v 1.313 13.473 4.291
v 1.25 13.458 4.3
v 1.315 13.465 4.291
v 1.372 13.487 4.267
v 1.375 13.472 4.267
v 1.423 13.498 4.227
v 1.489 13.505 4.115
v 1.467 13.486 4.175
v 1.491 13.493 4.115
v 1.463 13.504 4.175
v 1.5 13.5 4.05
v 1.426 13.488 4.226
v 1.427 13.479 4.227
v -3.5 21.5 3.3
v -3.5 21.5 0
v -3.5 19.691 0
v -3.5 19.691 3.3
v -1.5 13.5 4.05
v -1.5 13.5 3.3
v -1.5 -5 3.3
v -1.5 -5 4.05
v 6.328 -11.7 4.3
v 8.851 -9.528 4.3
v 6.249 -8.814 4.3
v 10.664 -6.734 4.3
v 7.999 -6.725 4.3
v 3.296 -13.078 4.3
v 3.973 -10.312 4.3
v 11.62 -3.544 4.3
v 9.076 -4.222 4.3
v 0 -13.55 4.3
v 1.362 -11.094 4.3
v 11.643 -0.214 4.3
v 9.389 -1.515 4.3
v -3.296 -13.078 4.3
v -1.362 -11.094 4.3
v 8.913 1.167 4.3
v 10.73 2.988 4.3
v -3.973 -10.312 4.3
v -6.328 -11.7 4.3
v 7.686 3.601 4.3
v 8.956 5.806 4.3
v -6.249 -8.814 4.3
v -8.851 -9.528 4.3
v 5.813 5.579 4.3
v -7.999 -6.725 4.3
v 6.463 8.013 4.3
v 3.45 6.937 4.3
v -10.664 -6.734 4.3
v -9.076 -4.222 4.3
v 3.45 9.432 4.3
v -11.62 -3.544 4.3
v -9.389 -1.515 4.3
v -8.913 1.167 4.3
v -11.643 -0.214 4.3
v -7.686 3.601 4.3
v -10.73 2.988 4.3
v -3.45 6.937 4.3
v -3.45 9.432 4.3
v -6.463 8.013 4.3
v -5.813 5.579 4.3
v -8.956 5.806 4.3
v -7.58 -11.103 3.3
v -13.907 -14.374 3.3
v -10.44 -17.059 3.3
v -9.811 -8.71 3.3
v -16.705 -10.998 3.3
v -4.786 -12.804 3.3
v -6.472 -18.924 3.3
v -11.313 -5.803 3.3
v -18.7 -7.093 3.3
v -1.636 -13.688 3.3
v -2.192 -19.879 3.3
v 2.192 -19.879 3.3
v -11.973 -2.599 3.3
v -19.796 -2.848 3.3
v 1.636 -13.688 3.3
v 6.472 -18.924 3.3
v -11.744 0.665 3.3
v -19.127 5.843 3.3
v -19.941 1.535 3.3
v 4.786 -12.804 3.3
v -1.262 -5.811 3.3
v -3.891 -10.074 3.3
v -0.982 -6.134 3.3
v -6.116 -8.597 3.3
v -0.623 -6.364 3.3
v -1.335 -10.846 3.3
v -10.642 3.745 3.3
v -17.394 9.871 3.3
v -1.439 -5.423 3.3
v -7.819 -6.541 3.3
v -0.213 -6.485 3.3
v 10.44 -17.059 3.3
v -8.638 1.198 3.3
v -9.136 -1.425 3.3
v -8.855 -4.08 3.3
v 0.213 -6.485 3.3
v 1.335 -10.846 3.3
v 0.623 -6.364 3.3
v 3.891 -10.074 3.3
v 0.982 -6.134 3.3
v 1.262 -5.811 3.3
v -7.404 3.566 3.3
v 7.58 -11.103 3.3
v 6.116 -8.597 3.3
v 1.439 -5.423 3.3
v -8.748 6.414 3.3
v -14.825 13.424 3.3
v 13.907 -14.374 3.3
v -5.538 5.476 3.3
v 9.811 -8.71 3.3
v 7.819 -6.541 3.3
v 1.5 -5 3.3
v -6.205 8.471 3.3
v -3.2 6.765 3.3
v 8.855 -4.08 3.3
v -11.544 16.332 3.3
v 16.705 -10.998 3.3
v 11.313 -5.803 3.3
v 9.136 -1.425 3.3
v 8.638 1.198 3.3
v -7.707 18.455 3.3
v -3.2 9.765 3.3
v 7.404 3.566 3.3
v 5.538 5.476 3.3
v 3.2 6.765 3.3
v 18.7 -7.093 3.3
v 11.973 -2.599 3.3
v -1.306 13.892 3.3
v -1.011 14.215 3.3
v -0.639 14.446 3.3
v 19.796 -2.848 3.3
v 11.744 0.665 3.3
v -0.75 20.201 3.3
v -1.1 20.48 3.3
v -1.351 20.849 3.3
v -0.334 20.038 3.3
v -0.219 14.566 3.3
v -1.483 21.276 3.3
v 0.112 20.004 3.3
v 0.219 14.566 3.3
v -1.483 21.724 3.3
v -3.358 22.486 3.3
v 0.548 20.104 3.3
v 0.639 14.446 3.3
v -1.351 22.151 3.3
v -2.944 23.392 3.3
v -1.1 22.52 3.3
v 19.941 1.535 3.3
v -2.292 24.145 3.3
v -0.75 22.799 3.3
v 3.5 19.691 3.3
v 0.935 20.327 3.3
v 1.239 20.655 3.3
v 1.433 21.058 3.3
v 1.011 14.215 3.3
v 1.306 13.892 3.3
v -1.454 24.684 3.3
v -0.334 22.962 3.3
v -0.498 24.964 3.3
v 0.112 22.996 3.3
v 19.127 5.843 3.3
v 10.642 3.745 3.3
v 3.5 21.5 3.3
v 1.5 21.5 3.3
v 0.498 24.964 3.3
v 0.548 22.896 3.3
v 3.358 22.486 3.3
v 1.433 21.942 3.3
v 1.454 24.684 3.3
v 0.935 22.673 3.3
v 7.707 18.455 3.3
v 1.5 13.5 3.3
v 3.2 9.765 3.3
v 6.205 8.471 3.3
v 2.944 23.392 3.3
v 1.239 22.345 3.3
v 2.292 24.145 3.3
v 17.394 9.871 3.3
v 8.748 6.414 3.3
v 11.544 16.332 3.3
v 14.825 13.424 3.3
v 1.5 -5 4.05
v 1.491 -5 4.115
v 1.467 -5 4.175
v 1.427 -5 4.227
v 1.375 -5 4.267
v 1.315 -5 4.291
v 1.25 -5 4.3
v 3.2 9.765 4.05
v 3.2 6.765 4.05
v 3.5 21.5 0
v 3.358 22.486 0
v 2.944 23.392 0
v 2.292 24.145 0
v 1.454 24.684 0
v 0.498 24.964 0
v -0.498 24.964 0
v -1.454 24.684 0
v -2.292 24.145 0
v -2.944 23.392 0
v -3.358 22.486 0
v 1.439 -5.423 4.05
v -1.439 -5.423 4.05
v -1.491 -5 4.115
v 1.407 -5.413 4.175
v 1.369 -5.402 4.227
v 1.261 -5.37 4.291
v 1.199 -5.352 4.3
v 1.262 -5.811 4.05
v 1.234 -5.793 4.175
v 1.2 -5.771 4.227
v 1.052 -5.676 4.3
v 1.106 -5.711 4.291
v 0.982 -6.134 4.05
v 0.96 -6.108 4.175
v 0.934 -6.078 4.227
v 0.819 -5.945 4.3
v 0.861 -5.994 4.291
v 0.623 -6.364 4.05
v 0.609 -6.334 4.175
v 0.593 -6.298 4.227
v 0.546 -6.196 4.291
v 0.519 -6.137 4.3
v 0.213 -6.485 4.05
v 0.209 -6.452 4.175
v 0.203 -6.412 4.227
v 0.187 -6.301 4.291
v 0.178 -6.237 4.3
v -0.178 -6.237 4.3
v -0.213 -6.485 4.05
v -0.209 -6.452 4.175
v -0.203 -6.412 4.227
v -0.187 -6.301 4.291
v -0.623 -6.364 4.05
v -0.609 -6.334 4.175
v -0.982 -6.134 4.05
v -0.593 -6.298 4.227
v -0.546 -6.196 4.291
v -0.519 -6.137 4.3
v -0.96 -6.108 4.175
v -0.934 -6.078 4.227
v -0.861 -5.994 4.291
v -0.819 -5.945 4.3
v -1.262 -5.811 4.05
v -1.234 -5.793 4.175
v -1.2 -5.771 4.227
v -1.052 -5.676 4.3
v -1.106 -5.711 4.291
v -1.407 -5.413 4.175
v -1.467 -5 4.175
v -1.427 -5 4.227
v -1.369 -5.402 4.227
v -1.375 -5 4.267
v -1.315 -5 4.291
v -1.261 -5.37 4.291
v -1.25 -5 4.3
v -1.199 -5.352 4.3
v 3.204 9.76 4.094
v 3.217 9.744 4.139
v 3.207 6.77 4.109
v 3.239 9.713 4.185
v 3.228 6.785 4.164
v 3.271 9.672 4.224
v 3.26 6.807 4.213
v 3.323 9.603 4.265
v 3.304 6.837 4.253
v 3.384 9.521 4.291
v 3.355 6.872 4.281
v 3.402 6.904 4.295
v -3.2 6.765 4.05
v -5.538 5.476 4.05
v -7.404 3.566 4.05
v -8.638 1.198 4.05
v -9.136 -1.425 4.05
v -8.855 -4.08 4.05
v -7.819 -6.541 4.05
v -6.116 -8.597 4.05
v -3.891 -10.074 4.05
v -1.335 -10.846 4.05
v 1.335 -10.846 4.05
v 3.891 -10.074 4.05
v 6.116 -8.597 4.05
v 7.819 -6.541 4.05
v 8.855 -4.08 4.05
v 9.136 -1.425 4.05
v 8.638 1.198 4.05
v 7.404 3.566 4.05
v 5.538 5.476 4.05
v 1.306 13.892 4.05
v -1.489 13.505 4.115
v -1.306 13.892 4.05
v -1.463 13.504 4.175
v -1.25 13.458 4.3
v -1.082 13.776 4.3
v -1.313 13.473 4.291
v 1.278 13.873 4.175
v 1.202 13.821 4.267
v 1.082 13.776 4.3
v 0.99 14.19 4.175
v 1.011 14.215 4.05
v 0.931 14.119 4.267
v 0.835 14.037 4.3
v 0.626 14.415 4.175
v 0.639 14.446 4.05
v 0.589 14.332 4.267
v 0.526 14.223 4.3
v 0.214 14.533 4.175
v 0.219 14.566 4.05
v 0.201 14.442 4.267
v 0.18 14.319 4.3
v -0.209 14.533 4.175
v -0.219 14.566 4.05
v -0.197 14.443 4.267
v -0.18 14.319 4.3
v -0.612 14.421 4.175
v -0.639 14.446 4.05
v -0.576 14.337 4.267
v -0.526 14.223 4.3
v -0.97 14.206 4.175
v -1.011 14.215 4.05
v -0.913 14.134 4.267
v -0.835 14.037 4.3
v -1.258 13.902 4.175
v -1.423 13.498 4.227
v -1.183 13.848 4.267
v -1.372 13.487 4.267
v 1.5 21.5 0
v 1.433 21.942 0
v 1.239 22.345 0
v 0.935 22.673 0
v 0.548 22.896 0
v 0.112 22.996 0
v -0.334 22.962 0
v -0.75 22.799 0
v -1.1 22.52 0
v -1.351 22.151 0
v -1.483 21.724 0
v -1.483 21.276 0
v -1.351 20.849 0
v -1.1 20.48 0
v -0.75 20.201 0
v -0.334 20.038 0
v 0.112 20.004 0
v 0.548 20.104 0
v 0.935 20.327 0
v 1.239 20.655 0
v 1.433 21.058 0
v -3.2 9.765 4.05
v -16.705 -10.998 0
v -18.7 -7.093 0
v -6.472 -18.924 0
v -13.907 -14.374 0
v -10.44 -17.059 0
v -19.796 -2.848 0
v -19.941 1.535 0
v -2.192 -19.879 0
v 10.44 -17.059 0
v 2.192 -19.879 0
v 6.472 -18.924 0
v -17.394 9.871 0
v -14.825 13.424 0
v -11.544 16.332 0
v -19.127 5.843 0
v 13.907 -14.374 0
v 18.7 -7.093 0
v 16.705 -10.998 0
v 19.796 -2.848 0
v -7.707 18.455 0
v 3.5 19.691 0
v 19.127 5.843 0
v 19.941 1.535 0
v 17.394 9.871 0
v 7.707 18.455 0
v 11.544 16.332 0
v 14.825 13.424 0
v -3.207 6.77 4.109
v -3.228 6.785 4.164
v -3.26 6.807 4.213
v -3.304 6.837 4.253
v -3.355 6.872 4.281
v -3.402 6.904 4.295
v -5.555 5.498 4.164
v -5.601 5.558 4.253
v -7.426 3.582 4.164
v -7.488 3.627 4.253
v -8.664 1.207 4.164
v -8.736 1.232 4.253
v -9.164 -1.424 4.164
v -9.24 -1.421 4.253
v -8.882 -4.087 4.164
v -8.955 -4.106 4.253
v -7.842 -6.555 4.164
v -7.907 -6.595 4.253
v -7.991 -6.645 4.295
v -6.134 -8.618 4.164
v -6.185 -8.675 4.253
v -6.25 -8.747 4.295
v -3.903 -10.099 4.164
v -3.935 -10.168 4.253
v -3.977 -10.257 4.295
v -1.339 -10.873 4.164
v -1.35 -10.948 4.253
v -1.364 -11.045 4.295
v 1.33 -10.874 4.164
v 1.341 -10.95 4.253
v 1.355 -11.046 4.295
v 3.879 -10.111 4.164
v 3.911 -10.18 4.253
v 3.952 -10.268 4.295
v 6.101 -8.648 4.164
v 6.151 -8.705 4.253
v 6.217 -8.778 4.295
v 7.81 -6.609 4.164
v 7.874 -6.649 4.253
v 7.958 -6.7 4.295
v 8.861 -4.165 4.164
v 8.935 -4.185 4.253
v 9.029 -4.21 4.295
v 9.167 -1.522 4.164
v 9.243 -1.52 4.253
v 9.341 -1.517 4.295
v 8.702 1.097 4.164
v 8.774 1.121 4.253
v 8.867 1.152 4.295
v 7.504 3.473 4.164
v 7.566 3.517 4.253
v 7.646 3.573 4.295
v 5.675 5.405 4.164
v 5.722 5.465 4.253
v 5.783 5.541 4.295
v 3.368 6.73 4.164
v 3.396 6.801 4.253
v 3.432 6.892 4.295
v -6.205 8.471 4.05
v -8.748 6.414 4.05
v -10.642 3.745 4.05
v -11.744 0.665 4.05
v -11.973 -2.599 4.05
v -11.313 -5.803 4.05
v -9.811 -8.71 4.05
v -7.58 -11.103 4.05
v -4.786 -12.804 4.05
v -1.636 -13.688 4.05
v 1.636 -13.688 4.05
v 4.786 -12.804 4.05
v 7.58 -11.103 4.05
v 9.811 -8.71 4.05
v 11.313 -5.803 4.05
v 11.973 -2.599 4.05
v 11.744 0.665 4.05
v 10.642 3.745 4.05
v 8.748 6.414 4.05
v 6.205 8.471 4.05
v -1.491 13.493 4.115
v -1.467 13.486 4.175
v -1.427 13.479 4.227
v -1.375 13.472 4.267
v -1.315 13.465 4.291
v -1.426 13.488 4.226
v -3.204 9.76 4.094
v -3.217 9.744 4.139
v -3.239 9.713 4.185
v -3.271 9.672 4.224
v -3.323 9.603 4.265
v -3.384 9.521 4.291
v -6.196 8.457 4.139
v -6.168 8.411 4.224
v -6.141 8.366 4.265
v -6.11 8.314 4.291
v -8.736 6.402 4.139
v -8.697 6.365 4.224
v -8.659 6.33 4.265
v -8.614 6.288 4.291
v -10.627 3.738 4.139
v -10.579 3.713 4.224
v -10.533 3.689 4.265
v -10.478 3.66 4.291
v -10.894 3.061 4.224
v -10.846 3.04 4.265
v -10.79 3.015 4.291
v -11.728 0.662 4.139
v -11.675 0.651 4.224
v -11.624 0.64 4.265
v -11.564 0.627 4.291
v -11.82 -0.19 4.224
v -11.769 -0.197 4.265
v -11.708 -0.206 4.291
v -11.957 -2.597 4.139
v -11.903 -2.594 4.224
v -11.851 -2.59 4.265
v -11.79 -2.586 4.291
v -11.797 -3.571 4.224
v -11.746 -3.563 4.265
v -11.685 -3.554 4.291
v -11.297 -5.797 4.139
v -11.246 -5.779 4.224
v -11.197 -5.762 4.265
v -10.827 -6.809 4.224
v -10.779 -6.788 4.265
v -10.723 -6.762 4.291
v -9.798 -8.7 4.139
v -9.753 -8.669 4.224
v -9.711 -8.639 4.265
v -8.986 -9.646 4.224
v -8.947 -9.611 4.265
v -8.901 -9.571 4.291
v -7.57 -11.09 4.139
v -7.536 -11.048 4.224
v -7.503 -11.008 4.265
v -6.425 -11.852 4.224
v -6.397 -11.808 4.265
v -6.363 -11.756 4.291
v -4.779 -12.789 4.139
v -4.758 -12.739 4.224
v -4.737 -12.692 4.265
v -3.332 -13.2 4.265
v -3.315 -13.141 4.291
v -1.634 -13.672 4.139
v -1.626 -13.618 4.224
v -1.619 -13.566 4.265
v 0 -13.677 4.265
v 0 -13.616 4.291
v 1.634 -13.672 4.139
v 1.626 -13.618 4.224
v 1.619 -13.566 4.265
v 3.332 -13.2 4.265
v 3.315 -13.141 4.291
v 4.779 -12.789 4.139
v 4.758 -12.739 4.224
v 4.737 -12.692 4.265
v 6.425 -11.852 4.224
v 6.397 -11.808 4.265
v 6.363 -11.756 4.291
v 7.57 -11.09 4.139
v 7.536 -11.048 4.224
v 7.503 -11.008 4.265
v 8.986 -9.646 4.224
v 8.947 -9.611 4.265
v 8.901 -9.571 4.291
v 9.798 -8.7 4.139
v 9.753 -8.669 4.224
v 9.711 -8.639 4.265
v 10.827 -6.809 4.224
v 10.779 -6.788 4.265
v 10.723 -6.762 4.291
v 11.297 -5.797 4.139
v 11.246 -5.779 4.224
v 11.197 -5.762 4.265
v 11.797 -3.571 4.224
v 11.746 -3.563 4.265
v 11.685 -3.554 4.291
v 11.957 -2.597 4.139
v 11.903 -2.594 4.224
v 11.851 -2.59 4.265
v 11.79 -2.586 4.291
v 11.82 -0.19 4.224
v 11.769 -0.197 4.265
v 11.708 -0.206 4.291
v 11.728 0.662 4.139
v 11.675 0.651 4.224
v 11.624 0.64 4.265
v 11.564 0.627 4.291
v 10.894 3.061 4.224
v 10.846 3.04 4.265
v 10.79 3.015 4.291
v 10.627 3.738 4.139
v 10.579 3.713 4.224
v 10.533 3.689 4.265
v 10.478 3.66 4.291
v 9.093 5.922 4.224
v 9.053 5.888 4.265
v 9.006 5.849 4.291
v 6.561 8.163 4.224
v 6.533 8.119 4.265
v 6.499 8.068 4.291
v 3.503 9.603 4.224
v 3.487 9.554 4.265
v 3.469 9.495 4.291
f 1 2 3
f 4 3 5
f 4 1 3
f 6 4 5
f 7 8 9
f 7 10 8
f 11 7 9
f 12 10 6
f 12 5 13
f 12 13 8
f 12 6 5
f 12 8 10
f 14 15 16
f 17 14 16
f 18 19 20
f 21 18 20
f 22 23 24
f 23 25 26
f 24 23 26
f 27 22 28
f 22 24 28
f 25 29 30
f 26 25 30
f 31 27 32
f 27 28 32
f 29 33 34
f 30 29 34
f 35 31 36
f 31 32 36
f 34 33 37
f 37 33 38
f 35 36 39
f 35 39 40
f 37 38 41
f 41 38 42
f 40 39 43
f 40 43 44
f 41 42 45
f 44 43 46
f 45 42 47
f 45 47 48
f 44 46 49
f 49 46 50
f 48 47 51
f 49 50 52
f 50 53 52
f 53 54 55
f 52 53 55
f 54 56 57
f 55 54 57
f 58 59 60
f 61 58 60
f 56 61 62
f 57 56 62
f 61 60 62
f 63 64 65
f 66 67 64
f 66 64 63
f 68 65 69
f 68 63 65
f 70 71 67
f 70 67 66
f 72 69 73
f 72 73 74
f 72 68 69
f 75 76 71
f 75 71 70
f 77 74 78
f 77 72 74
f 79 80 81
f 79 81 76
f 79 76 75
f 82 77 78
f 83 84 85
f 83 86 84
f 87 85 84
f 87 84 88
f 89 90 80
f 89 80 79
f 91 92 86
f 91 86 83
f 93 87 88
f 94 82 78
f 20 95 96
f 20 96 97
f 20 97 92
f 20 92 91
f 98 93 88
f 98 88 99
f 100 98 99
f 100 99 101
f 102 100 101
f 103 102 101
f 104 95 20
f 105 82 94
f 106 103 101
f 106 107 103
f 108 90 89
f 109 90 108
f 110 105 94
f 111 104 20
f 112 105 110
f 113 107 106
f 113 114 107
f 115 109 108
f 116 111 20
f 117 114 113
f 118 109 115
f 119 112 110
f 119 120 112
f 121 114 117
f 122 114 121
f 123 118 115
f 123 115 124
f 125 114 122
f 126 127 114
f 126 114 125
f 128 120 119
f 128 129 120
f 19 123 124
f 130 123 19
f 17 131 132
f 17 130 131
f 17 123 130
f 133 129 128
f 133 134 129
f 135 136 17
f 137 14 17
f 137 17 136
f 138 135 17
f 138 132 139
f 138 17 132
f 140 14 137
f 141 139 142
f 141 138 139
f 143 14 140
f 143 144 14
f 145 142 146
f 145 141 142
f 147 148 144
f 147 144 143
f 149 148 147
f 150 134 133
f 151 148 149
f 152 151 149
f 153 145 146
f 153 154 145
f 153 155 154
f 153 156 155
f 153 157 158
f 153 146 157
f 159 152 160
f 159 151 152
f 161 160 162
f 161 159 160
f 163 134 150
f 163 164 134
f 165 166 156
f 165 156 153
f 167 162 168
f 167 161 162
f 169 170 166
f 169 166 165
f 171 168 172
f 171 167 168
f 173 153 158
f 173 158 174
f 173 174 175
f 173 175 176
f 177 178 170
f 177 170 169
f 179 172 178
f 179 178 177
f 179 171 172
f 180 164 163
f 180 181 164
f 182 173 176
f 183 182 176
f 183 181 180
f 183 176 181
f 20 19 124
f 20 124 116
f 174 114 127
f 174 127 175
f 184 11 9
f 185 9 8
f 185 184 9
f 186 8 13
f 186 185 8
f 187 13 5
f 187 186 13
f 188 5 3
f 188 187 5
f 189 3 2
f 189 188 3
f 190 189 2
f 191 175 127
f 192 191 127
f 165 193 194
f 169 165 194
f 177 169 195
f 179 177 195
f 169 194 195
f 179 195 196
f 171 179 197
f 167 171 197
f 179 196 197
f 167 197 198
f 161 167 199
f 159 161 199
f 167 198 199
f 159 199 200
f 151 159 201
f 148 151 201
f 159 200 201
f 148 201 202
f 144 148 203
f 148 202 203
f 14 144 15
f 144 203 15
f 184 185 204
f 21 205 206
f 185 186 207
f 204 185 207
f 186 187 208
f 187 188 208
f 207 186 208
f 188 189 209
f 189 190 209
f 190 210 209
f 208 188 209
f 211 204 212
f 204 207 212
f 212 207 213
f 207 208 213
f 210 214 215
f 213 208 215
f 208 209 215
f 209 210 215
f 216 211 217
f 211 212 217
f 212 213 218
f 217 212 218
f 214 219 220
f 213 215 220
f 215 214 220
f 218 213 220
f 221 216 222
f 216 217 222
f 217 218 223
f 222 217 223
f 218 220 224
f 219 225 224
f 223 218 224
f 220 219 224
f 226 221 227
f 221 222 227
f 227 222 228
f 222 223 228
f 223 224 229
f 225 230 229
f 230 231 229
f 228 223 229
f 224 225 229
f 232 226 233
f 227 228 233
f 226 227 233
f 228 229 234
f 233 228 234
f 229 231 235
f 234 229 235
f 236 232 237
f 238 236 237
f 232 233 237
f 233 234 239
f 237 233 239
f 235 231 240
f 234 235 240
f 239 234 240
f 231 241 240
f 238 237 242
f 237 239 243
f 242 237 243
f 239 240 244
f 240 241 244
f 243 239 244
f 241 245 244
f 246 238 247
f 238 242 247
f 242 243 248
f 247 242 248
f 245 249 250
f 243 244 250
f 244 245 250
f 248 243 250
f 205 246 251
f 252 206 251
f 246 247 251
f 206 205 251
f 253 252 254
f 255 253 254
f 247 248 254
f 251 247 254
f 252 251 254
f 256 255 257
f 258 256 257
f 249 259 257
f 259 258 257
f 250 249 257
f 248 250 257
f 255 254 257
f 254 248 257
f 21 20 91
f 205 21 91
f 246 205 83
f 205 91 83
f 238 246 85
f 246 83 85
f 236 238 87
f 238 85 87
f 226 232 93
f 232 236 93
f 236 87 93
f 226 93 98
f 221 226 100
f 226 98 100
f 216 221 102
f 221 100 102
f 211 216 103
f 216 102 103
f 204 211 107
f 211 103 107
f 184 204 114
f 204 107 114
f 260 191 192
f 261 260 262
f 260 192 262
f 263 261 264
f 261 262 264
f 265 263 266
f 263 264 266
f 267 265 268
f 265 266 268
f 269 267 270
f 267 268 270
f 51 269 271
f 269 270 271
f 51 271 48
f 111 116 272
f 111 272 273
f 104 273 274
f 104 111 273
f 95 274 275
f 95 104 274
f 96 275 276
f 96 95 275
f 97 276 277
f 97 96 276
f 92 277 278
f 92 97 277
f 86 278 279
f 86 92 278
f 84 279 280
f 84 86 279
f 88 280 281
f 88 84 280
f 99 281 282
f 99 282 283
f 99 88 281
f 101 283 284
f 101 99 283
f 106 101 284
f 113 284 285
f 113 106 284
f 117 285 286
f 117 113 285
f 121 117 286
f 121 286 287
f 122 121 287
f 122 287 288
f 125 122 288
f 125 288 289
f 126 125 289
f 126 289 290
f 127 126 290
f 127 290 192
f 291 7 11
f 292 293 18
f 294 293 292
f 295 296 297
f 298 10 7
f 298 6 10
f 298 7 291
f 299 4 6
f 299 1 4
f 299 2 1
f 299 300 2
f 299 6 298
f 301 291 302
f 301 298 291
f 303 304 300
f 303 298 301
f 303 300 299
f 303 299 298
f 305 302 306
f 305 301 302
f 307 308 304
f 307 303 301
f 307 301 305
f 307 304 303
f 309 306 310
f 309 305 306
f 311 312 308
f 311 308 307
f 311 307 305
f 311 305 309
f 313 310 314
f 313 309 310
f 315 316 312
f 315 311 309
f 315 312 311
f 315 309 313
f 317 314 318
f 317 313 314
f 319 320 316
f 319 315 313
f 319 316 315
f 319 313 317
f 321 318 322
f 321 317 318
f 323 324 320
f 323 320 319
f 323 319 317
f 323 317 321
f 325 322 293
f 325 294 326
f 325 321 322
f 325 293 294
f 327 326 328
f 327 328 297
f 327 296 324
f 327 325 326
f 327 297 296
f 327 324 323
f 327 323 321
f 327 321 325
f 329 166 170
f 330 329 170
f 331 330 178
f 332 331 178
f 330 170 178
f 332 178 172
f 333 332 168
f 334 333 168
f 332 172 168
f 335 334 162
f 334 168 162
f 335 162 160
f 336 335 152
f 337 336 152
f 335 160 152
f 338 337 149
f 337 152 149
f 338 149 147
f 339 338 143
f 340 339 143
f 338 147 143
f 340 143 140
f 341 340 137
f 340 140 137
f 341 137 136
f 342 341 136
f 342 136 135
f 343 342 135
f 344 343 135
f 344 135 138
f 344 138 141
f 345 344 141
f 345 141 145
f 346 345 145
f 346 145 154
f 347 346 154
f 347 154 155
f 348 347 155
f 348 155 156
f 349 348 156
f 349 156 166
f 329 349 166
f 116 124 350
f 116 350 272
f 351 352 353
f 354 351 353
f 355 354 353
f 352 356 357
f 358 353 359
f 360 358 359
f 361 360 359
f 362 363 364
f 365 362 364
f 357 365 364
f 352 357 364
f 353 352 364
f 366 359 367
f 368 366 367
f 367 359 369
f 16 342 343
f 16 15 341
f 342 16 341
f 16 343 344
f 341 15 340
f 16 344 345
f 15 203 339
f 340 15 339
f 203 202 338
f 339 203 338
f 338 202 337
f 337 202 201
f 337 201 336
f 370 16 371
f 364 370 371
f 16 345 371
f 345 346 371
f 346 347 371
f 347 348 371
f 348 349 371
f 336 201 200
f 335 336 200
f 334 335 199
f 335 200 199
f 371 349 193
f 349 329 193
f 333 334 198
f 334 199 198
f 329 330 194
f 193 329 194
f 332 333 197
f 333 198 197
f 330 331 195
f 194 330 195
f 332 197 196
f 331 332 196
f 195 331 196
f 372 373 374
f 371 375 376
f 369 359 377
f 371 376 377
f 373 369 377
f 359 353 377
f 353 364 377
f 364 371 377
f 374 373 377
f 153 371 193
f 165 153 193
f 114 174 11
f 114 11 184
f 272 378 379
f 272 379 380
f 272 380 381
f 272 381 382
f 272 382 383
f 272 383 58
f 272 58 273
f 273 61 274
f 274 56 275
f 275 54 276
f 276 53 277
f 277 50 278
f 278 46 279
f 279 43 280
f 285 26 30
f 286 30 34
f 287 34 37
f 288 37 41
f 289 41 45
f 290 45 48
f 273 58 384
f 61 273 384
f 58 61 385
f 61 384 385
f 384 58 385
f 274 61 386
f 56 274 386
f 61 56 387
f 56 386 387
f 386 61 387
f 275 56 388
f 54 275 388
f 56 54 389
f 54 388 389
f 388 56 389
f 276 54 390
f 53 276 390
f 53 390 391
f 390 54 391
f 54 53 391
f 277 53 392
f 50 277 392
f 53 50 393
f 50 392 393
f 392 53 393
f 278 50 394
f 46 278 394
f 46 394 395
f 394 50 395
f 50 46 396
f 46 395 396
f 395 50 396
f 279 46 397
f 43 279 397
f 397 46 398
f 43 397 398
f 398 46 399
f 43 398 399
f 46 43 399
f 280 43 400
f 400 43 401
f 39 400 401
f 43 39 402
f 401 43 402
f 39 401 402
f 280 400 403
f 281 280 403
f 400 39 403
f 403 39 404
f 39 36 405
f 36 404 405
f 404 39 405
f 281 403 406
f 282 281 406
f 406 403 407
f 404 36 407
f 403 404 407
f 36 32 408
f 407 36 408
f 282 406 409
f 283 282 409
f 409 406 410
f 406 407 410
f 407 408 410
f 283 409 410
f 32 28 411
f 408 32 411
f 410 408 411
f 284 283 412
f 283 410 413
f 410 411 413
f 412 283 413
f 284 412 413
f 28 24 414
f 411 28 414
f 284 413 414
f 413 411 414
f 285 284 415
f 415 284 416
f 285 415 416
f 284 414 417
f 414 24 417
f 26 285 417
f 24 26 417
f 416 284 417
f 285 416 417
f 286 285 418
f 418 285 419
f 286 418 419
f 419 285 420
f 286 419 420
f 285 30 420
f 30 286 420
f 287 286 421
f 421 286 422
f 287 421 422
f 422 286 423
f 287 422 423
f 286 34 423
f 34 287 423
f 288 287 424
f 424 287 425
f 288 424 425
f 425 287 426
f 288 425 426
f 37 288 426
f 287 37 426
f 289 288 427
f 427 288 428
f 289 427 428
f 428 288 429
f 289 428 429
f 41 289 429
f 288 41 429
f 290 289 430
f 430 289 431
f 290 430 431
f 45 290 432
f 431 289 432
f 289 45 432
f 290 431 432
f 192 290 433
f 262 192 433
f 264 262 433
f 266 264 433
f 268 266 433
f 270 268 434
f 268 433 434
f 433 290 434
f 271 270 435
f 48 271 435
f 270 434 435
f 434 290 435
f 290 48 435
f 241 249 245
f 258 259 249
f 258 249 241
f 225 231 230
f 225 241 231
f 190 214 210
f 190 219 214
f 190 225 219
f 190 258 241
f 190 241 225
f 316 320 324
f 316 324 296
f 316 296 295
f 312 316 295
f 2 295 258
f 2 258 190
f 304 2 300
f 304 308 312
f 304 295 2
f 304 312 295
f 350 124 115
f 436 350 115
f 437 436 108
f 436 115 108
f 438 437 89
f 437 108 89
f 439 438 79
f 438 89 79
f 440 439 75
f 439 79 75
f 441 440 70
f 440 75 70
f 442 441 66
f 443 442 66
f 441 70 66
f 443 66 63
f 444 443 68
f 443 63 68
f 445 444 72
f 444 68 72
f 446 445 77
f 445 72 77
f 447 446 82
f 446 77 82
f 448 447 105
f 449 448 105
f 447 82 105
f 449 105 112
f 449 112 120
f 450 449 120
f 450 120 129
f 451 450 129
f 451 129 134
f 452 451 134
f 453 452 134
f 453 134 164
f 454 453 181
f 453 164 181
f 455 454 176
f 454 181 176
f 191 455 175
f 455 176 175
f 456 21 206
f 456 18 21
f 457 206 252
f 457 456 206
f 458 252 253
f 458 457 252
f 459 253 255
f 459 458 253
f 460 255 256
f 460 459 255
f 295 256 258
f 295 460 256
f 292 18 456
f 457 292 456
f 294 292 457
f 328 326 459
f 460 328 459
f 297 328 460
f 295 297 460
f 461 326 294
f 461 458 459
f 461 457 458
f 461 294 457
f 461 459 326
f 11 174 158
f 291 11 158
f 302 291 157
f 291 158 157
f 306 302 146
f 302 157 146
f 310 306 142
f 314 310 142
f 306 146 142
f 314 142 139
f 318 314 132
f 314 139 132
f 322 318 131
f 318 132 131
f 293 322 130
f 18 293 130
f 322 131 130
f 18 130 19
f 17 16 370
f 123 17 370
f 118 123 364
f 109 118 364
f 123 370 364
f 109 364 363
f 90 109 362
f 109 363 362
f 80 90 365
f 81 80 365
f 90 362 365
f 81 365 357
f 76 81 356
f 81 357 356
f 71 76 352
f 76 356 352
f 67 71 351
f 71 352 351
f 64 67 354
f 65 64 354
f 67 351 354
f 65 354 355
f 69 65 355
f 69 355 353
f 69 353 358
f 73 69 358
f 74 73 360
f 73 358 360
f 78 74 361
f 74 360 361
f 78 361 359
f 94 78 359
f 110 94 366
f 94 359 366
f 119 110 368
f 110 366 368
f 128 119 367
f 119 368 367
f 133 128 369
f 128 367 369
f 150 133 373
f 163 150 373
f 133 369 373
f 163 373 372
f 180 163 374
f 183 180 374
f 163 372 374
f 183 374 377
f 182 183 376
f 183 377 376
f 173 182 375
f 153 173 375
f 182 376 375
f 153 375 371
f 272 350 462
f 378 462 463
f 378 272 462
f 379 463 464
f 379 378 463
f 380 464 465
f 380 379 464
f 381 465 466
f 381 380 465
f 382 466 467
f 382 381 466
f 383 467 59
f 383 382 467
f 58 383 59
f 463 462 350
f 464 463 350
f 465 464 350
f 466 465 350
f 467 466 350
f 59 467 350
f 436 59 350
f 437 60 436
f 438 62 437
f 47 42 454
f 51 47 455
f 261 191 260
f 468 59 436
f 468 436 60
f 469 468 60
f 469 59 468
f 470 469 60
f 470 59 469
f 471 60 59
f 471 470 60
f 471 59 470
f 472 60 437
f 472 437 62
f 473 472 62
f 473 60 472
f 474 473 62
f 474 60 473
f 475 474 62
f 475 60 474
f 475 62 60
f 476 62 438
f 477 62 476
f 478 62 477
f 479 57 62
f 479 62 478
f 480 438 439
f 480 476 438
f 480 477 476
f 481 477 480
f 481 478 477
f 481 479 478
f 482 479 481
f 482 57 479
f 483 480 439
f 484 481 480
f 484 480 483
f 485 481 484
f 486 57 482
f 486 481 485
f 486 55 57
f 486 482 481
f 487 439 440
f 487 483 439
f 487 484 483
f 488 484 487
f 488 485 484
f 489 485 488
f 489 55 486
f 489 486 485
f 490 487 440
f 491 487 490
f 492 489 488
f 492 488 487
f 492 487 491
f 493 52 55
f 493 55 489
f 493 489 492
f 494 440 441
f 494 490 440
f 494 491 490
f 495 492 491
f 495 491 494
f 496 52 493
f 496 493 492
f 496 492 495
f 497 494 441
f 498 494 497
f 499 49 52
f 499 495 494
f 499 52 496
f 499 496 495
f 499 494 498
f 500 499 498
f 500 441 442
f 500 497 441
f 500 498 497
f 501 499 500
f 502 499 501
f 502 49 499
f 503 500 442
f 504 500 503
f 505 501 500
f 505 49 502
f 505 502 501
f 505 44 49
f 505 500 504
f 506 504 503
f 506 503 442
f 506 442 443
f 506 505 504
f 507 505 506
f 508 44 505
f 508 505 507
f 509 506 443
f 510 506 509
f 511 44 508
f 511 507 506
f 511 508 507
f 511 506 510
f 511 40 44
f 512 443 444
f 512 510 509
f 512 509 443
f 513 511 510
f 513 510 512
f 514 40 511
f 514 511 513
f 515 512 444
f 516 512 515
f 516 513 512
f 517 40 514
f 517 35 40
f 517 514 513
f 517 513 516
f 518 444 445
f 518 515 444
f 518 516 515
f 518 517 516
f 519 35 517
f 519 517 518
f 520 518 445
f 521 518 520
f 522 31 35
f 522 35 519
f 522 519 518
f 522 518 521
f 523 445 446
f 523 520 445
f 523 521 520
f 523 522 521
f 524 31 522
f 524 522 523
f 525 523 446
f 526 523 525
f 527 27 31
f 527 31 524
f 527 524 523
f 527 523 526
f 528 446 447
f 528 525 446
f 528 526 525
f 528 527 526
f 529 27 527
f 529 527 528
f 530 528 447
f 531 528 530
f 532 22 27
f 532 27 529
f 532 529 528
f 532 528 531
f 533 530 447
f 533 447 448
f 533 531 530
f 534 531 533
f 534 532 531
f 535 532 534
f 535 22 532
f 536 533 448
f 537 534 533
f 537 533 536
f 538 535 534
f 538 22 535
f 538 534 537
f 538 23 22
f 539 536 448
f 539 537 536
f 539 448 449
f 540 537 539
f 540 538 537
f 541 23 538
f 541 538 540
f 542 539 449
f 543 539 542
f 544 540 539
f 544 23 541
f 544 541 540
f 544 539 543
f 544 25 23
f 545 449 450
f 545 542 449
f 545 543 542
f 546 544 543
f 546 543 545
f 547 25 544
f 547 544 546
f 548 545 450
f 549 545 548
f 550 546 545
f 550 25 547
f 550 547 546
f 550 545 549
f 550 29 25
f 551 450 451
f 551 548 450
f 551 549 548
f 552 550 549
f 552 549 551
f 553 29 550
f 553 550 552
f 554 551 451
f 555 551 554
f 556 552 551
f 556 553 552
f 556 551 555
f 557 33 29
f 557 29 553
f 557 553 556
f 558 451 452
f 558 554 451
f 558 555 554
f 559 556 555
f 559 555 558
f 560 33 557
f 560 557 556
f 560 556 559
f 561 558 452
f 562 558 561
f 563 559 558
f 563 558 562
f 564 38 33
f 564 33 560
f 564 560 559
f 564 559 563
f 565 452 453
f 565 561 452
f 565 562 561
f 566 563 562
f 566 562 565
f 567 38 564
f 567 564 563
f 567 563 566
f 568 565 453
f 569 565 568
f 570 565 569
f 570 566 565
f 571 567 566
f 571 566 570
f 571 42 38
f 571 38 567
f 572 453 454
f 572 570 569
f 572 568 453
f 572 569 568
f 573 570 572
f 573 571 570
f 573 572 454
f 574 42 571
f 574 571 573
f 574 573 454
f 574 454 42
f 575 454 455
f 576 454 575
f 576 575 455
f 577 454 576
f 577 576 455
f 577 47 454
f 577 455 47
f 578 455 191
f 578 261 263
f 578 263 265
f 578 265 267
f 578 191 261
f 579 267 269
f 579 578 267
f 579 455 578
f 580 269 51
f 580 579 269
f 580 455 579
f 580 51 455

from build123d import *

# Parameters (mm, degrees)
EXTRUDE_DEPTH = 3.3
SKETCH001_R   = 1.5
POCKET_DEPTH  = 3.301
PAD_DEPTH     = 1
FILLET_R      = 0.25


with BuildPart() as part:
    # Sketch → Extrude (new body)
    with BuildSketch(Plane.XY):
        with BuildLine():
            ThreePointArc((3.5, 21.5), (0, 25), (-3.5, 21.5))
            Line((-3.5, 21.5), (-3.5, 19.691369))
            ThreePointArc((-3.5, 19.691369), (0, -20), (3.5, 19.691369))
            Line((3.5, 19.691369), (3.5, 21.5))
        make_face()
    extrude(amount=EXTRUDE_DEPTH)

    # Sketch001 (on Face6 of Extrude) → Pocket (cut, through all)
    with BuildSketch(Plane.XY.offset(3.3)):
        with Locations((0, 21.5)):
            Circle(SKETCH001_R)
    extrude(amount=-POCKET_DEPTH, mode=Mode.SUBTRACT)

    # Sketch002 (on Face1 of CopyClone) → Pad (join)
    with BuildSketch(Plane.XY.offset(3.3)):
        with BuildLine():
            Line((-1.5, 13.5), (-1.5, -5))
            ThreePointArc((-1.5, -5), (0, -6.5), (1.5, -5))
            Line((1.5, 13.5), (1.5, -5))
            ThreePointArc((1.5, 13.5), (0, 14.581139), (-1.5, 13.5))
        make_face()
        with BuildLine():
            Line((-3.2, 9.765466), (-3.2, 6.765466))
            ThreePointArc((-3.2, 6.765466), (0, -10.943698), (3.2, 6.765466))
            Line((3.2, 9.765466), (3.2, 6.765466))
            ThreePointArc((-3.2, 9.765466), (0, -13.8), (3.2, 9.765466))
        make_face()
    extrude(amount=PAD_DEPTH)

    # Fillet
    fillet_edges = [part.edges().sort_by_distance(p)[0] for p in [
        (0, 14.581139, 4.3),
        (1.5, 4.25, 4.3),
        (0, -6.5, 4.3),
        (-1.5, 4.25, 4.3),
        (-3.2, 8.265466, 4.3),
        (0, -10.943698, 4.3),
        (3.2, 8.265466, 4.3),
        (0, -13.8, 4.3),
    ]]
    fillet(fillet_edges, radius=FILLET_R)


solid = part.part
